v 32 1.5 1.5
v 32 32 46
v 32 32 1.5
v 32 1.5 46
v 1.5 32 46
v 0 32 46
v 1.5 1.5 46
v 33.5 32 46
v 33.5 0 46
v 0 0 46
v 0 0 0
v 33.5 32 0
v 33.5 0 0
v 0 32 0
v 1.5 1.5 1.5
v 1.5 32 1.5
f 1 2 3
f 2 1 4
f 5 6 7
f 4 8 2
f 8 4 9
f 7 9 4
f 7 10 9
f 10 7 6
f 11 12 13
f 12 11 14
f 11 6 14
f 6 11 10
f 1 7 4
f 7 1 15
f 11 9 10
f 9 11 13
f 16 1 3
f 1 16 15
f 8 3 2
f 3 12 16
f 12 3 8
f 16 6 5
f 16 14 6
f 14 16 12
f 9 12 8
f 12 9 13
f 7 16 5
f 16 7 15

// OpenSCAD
cube([32,1.5,46]);
cube([32,32,1.5]);
translate([32,0,0]){
cube([1.5,32,46]);
}
cube([1.5,32,46]);
